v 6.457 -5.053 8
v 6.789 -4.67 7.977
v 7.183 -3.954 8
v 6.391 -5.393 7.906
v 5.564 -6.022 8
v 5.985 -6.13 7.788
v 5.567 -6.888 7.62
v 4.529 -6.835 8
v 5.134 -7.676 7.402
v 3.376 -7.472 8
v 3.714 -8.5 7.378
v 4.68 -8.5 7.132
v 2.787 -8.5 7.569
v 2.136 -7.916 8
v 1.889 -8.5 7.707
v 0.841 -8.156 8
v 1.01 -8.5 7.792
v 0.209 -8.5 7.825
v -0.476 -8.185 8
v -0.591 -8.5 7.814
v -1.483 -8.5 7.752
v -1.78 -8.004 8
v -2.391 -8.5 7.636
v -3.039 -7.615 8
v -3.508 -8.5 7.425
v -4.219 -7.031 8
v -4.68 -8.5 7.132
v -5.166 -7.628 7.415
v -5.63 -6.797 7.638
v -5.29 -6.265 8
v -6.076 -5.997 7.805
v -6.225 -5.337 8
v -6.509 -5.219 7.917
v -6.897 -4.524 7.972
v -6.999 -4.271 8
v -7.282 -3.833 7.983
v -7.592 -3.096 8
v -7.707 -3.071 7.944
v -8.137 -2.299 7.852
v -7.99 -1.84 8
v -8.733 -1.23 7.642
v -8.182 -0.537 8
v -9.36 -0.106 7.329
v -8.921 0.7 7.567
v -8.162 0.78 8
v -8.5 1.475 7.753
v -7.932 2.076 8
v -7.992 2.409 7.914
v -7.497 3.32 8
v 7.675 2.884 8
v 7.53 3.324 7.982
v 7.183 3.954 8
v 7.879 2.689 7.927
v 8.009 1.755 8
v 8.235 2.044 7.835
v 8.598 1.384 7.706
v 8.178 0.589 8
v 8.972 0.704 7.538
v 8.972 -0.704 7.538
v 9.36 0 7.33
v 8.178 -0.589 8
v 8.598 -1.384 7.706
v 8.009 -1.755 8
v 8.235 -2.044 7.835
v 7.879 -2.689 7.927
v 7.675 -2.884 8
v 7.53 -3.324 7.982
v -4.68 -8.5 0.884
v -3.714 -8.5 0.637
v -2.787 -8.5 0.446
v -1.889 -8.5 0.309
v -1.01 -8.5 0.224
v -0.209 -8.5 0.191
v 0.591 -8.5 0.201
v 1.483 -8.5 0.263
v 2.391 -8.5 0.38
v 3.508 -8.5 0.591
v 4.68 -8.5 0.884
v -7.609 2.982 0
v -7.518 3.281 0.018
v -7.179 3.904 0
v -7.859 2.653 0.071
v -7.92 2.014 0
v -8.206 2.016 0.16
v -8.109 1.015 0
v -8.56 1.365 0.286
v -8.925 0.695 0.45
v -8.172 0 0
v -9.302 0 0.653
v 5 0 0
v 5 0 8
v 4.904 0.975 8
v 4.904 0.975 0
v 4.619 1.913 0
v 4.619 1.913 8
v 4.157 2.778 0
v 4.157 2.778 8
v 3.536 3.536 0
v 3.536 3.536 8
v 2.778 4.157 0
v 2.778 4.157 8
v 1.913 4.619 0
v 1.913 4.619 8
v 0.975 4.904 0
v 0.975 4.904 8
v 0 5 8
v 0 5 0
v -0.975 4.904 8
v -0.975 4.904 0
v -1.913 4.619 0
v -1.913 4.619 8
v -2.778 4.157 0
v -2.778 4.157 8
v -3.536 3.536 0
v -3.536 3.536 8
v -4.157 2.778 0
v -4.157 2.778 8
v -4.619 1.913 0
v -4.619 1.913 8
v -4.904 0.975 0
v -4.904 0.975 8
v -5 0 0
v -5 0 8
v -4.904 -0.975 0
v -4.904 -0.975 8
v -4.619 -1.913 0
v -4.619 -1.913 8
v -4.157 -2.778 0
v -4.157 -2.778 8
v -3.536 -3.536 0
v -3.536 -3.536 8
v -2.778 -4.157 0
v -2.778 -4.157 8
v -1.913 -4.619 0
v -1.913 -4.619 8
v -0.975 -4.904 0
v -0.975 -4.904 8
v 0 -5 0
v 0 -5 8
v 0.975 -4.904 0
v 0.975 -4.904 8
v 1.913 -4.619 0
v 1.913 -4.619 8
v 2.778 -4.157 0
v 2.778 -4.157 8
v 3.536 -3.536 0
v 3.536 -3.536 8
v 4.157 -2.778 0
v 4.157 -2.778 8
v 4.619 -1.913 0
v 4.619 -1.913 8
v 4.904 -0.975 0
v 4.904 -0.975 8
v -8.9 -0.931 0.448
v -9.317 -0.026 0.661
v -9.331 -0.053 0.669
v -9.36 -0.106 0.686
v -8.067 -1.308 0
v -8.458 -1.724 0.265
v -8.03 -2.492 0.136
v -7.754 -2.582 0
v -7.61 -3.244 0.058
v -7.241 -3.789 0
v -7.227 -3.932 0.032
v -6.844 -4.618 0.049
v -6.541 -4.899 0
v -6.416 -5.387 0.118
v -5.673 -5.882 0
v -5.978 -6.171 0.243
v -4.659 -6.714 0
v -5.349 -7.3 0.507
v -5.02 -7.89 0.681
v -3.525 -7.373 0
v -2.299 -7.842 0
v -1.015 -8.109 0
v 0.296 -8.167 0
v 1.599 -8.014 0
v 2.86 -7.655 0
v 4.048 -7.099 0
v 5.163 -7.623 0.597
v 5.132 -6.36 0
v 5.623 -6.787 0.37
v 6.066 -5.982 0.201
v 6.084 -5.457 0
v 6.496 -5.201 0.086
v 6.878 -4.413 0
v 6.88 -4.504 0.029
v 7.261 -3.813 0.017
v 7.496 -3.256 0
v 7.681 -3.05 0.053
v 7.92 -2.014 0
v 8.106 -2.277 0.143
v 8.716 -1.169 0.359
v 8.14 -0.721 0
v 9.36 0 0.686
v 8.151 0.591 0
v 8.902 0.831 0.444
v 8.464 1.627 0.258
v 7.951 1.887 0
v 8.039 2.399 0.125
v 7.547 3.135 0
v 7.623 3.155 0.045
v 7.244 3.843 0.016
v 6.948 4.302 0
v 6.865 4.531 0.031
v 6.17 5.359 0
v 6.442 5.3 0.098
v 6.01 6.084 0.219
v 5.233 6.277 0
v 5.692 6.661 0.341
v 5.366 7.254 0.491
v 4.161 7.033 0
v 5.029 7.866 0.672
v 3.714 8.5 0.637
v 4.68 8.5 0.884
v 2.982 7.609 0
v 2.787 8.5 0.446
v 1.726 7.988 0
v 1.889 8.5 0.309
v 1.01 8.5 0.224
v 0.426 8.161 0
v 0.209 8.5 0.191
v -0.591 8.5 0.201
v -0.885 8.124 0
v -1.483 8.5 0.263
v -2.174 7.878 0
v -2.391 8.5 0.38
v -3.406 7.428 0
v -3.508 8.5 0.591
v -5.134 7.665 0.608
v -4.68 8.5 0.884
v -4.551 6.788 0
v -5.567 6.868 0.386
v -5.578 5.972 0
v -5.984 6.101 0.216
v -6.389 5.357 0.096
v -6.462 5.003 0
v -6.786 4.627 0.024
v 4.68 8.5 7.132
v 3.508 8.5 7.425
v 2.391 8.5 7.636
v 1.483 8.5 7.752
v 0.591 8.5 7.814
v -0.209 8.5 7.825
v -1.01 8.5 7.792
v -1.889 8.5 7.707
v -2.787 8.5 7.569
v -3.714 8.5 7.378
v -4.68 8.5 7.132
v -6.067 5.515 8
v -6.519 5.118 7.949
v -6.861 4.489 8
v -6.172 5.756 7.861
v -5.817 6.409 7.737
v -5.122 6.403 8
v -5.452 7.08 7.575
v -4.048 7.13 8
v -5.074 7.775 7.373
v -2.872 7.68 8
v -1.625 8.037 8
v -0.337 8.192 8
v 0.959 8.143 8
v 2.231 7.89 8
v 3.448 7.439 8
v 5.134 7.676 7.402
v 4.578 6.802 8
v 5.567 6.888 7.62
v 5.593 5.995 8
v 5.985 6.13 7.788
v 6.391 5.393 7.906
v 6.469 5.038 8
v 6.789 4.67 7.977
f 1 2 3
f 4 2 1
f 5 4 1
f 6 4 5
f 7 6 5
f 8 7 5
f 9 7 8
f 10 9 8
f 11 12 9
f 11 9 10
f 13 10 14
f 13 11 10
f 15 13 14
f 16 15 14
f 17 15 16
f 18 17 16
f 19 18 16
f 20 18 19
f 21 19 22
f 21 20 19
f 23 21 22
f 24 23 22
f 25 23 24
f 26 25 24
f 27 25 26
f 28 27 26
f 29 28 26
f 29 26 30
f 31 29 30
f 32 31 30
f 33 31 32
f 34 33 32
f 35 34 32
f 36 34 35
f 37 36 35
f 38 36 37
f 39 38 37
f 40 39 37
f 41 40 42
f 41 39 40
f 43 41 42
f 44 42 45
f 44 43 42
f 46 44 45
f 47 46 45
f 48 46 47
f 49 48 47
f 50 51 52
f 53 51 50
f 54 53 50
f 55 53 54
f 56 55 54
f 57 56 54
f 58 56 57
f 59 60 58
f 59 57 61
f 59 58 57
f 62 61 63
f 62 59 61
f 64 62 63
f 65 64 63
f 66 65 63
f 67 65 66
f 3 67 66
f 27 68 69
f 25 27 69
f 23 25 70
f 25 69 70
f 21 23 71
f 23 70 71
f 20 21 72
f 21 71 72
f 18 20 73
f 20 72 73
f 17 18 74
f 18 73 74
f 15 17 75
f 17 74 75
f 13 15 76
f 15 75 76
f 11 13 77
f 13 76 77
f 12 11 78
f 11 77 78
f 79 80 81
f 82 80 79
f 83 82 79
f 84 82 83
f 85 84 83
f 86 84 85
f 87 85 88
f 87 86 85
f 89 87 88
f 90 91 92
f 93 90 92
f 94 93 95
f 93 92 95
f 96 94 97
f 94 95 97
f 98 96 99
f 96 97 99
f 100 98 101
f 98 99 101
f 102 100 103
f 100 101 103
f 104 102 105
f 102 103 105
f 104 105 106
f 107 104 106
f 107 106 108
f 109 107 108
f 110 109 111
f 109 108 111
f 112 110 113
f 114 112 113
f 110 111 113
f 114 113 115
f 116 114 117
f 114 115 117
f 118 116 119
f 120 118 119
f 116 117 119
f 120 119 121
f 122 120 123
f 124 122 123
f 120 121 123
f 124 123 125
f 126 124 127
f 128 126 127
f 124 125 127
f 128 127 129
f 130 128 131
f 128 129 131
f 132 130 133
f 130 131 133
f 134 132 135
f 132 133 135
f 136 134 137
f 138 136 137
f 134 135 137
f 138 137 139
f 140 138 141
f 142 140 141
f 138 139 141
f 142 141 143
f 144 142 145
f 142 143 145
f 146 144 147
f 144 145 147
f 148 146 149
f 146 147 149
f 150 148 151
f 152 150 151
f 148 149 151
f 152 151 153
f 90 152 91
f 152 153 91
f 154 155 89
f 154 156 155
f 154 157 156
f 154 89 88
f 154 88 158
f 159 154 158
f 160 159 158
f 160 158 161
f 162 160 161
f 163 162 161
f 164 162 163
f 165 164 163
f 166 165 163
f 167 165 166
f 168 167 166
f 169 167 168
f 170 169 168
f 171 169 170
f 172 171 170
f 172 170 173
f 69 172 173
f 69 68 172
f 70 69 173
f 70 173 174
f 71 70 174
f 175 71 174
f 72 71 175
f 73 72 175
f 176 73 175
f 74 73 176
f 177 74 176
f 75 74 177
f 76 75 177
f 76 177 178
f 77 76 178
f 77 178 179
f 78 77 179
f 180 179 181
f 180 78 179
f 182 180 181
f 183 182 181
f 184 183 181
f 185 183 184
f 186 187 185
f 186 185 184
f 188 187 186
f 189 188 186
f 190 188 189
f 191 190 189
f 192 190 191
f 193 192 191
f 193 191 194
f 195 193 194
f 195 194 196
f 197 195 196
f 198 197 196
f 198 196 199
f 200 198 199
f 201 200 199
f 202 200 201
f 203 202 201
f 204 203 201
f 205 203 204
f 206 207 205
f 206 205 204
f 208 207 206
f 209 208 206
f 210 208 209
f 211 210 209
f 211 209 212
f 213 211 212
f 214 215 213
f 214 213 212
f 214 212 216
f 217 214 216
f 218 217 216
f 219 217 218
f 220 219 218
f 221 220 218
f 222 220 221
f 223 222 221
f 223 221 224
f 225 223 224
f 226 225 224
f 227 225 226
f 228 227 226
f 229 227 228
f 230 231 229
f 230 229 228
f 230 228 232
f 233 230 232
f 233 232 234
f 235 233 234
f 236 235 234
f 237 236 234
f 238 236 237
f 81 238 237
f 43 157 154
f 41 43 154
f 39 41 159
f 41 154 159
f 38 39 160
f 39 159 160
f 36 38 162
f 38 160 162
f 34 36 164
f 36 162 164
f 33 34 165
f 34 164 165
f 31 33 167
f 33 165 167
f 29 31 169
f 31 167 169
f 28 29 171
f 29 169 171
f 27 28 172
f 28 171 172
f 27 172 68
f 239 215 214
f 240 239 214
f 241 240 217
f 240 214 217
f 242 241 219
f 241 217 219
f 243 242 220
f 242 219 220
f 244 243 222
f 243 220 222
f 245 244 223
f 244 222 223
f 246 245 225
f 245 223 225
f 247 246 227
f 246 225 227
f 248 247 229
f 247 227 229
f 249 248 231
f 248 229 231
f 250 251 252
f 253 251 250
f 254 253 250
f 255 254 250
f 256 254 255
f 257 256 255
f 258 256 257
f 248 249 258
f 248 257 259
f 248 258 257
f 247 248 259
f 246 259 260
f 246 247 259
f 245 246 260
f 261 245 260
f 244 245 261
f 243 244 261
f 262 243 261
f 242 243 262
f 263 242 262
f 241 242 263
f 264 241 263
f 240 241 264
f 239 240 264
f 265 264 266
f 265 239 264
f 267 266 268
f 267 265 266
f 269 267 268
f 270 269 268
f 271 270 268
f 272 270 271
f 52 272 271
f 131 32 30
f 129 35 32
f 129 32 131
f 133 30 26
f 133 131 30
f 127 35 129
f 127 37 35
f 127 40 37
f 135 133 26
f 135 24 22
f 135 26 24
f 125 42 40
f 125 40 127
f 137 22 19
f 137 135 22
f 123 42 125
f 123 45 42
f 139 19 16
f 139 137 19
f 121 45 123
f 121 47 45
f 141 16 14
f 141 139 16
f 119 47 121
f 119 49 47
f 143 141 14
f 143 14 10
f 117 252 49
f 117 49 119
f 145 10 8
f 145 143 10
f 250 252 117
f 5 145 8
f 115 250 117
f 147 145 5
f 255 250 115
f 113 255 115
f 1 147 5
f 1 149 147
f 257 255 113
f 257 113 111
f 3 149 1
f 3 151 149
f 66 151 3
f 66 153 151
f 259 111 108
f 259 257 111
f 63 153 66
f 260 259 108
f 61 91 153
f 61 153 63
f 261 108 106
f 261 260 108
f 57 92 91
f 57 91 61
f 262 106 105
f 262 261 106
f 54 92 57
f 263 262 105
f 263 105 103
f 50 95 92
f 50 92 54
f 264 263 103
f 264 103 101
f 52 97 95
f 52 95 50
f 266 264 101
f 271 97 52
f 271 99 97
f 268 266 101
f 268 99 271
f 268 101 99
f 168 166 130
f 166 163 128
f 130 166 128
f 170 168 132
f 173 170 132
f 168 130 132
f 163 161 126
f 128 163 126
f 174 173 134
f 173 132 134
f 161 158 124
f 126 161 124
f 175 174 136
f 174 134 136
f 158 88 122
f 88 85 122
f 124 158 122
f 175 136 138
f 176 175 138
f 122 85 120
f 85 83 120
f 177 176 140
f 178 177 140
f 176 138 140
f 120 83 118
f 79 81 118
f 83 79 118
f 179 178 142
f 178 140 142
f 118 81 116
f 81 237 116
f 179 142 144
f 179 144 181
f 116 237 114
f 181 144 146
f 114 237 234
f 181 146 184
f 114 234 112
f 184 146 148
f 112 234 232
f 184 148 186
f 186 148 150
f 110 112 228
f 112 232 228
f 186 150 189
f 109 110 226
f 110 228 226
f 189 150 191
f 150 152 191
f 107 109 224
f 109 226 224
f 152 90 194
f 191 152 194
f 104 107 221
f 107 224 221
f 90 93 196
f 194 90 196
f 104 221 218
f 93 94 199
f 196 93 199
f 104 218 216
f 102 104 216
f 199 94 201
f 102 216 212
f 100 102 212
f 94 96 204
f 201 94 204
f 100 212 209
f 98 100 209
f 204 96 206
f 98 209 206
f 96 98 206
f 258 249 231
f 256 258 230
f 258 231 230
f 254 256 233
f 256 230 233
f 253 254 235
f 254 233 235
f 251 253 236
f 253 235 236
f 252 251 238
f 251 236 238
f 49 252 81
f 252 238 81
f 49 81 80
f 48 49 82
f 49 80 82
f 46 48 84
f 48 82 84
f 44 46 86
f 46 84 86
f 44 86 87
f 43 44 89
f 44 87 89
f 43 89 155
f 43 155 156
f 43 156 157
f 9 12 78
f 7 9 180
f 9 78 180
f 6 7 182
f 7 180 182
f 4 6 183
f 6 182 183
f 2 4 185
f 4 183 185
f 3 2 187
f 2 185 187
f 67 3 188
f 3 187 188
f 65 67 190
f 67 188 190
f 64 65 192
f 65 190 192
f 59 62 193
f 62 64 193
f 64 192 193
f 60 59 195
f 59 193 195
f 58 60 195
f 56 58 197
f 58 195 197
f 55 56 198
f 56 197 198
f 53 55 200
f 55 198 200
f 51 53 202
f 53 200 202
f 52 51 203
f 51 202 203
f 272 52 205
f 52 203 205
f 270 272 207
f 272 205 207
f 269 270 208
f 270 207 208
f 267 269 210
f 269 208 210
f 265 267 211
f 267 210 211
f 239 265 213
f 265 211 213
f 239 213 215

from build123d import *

# Parameters (mm, degrees)
BOSS_EXTRUDE1_DEPTH = 8
SKETCH2_OUTSIDE_W   = 60.666
SKETCH2_OUTSIDE_H   = 58.946
SKETCH2_OUTSIDE_R   = 8.199202844
CUT_EXTRUDE1_DEPTH  = 10
CUT_EXTRUDE1_TAPER  = 60
SKETCH3_OUTSIDE_W   = 29.488
SKETCH3_OUTSIDE_H   = 27.768
SKETCH3_OUTSIDE_R   = 8.172152793
CUT_EXTRUDE2_DEPTH  = 1
CUT_EXTRUDE2_TAPER  = 60
SKETCH4_R           = 5
CUT_EXTRUDE3_DEPTH  = 8


with BuildPart() as part:
    # Sketch1 → Boss-Extrude1 (new body)
    with BuildSketch(Plane.XY):
        Polygon((9.359699903, 0), (4.68, 8.5), (-4.68, 8.5), (-9.36, -0.105997779), (-4.68, -8.5), (4.68, -8.5), align=None)
    extrude(amount=BOSS_EXTRUDE1_DEPTH)

    # Sketch2 outside → Cut-Extrude1 (cut)
    with BuildSketch(Plane.XY.offset(8)):
        Rectangle(SKETCH2_OUTSIDE_W, SKETCH2_OUTSIDE_H)
        Circle(SKETCH2_OUTSIDE_R, mode=Mode.SUBTRACT)
    extrude(amount=-CUT_EXTRUDE1_DEPTH, taper=CUT_EXTRUDE1_TAPER, mode=Mode.SUBTRACT)

    # Sketch3 outside → Cut-Extrude2 (cut)
    with BuildSketch(Plane(origin=(0, 0, 0), x_dir=(-1, 0, 0), z_dir=(0, 0, -1))):
        Rectangle(SKETCH3_OUTSIDE_W, SKETCH3_OUTSIDE_H)
        Circle(SKETCH3_OUTSIDE_R, mode=Mode.SUBTRACT)
    extrude(amount=-CUT_EXTRUDE2_DEPTH, taper=CUT_EXTRUDE2_TAPER, mode=Mode.SUBTRACT)

    # Sketch4 → Cut-Extrude3 (cut)
    with BuildSketch(Plane.XY.offset(8)):
        Circle(SKETCH4_R)
    extrude(amount=-CUT_EXTRUDE3_DEPTH, mode=Mode.SUBTRACT)


solid = part.part
